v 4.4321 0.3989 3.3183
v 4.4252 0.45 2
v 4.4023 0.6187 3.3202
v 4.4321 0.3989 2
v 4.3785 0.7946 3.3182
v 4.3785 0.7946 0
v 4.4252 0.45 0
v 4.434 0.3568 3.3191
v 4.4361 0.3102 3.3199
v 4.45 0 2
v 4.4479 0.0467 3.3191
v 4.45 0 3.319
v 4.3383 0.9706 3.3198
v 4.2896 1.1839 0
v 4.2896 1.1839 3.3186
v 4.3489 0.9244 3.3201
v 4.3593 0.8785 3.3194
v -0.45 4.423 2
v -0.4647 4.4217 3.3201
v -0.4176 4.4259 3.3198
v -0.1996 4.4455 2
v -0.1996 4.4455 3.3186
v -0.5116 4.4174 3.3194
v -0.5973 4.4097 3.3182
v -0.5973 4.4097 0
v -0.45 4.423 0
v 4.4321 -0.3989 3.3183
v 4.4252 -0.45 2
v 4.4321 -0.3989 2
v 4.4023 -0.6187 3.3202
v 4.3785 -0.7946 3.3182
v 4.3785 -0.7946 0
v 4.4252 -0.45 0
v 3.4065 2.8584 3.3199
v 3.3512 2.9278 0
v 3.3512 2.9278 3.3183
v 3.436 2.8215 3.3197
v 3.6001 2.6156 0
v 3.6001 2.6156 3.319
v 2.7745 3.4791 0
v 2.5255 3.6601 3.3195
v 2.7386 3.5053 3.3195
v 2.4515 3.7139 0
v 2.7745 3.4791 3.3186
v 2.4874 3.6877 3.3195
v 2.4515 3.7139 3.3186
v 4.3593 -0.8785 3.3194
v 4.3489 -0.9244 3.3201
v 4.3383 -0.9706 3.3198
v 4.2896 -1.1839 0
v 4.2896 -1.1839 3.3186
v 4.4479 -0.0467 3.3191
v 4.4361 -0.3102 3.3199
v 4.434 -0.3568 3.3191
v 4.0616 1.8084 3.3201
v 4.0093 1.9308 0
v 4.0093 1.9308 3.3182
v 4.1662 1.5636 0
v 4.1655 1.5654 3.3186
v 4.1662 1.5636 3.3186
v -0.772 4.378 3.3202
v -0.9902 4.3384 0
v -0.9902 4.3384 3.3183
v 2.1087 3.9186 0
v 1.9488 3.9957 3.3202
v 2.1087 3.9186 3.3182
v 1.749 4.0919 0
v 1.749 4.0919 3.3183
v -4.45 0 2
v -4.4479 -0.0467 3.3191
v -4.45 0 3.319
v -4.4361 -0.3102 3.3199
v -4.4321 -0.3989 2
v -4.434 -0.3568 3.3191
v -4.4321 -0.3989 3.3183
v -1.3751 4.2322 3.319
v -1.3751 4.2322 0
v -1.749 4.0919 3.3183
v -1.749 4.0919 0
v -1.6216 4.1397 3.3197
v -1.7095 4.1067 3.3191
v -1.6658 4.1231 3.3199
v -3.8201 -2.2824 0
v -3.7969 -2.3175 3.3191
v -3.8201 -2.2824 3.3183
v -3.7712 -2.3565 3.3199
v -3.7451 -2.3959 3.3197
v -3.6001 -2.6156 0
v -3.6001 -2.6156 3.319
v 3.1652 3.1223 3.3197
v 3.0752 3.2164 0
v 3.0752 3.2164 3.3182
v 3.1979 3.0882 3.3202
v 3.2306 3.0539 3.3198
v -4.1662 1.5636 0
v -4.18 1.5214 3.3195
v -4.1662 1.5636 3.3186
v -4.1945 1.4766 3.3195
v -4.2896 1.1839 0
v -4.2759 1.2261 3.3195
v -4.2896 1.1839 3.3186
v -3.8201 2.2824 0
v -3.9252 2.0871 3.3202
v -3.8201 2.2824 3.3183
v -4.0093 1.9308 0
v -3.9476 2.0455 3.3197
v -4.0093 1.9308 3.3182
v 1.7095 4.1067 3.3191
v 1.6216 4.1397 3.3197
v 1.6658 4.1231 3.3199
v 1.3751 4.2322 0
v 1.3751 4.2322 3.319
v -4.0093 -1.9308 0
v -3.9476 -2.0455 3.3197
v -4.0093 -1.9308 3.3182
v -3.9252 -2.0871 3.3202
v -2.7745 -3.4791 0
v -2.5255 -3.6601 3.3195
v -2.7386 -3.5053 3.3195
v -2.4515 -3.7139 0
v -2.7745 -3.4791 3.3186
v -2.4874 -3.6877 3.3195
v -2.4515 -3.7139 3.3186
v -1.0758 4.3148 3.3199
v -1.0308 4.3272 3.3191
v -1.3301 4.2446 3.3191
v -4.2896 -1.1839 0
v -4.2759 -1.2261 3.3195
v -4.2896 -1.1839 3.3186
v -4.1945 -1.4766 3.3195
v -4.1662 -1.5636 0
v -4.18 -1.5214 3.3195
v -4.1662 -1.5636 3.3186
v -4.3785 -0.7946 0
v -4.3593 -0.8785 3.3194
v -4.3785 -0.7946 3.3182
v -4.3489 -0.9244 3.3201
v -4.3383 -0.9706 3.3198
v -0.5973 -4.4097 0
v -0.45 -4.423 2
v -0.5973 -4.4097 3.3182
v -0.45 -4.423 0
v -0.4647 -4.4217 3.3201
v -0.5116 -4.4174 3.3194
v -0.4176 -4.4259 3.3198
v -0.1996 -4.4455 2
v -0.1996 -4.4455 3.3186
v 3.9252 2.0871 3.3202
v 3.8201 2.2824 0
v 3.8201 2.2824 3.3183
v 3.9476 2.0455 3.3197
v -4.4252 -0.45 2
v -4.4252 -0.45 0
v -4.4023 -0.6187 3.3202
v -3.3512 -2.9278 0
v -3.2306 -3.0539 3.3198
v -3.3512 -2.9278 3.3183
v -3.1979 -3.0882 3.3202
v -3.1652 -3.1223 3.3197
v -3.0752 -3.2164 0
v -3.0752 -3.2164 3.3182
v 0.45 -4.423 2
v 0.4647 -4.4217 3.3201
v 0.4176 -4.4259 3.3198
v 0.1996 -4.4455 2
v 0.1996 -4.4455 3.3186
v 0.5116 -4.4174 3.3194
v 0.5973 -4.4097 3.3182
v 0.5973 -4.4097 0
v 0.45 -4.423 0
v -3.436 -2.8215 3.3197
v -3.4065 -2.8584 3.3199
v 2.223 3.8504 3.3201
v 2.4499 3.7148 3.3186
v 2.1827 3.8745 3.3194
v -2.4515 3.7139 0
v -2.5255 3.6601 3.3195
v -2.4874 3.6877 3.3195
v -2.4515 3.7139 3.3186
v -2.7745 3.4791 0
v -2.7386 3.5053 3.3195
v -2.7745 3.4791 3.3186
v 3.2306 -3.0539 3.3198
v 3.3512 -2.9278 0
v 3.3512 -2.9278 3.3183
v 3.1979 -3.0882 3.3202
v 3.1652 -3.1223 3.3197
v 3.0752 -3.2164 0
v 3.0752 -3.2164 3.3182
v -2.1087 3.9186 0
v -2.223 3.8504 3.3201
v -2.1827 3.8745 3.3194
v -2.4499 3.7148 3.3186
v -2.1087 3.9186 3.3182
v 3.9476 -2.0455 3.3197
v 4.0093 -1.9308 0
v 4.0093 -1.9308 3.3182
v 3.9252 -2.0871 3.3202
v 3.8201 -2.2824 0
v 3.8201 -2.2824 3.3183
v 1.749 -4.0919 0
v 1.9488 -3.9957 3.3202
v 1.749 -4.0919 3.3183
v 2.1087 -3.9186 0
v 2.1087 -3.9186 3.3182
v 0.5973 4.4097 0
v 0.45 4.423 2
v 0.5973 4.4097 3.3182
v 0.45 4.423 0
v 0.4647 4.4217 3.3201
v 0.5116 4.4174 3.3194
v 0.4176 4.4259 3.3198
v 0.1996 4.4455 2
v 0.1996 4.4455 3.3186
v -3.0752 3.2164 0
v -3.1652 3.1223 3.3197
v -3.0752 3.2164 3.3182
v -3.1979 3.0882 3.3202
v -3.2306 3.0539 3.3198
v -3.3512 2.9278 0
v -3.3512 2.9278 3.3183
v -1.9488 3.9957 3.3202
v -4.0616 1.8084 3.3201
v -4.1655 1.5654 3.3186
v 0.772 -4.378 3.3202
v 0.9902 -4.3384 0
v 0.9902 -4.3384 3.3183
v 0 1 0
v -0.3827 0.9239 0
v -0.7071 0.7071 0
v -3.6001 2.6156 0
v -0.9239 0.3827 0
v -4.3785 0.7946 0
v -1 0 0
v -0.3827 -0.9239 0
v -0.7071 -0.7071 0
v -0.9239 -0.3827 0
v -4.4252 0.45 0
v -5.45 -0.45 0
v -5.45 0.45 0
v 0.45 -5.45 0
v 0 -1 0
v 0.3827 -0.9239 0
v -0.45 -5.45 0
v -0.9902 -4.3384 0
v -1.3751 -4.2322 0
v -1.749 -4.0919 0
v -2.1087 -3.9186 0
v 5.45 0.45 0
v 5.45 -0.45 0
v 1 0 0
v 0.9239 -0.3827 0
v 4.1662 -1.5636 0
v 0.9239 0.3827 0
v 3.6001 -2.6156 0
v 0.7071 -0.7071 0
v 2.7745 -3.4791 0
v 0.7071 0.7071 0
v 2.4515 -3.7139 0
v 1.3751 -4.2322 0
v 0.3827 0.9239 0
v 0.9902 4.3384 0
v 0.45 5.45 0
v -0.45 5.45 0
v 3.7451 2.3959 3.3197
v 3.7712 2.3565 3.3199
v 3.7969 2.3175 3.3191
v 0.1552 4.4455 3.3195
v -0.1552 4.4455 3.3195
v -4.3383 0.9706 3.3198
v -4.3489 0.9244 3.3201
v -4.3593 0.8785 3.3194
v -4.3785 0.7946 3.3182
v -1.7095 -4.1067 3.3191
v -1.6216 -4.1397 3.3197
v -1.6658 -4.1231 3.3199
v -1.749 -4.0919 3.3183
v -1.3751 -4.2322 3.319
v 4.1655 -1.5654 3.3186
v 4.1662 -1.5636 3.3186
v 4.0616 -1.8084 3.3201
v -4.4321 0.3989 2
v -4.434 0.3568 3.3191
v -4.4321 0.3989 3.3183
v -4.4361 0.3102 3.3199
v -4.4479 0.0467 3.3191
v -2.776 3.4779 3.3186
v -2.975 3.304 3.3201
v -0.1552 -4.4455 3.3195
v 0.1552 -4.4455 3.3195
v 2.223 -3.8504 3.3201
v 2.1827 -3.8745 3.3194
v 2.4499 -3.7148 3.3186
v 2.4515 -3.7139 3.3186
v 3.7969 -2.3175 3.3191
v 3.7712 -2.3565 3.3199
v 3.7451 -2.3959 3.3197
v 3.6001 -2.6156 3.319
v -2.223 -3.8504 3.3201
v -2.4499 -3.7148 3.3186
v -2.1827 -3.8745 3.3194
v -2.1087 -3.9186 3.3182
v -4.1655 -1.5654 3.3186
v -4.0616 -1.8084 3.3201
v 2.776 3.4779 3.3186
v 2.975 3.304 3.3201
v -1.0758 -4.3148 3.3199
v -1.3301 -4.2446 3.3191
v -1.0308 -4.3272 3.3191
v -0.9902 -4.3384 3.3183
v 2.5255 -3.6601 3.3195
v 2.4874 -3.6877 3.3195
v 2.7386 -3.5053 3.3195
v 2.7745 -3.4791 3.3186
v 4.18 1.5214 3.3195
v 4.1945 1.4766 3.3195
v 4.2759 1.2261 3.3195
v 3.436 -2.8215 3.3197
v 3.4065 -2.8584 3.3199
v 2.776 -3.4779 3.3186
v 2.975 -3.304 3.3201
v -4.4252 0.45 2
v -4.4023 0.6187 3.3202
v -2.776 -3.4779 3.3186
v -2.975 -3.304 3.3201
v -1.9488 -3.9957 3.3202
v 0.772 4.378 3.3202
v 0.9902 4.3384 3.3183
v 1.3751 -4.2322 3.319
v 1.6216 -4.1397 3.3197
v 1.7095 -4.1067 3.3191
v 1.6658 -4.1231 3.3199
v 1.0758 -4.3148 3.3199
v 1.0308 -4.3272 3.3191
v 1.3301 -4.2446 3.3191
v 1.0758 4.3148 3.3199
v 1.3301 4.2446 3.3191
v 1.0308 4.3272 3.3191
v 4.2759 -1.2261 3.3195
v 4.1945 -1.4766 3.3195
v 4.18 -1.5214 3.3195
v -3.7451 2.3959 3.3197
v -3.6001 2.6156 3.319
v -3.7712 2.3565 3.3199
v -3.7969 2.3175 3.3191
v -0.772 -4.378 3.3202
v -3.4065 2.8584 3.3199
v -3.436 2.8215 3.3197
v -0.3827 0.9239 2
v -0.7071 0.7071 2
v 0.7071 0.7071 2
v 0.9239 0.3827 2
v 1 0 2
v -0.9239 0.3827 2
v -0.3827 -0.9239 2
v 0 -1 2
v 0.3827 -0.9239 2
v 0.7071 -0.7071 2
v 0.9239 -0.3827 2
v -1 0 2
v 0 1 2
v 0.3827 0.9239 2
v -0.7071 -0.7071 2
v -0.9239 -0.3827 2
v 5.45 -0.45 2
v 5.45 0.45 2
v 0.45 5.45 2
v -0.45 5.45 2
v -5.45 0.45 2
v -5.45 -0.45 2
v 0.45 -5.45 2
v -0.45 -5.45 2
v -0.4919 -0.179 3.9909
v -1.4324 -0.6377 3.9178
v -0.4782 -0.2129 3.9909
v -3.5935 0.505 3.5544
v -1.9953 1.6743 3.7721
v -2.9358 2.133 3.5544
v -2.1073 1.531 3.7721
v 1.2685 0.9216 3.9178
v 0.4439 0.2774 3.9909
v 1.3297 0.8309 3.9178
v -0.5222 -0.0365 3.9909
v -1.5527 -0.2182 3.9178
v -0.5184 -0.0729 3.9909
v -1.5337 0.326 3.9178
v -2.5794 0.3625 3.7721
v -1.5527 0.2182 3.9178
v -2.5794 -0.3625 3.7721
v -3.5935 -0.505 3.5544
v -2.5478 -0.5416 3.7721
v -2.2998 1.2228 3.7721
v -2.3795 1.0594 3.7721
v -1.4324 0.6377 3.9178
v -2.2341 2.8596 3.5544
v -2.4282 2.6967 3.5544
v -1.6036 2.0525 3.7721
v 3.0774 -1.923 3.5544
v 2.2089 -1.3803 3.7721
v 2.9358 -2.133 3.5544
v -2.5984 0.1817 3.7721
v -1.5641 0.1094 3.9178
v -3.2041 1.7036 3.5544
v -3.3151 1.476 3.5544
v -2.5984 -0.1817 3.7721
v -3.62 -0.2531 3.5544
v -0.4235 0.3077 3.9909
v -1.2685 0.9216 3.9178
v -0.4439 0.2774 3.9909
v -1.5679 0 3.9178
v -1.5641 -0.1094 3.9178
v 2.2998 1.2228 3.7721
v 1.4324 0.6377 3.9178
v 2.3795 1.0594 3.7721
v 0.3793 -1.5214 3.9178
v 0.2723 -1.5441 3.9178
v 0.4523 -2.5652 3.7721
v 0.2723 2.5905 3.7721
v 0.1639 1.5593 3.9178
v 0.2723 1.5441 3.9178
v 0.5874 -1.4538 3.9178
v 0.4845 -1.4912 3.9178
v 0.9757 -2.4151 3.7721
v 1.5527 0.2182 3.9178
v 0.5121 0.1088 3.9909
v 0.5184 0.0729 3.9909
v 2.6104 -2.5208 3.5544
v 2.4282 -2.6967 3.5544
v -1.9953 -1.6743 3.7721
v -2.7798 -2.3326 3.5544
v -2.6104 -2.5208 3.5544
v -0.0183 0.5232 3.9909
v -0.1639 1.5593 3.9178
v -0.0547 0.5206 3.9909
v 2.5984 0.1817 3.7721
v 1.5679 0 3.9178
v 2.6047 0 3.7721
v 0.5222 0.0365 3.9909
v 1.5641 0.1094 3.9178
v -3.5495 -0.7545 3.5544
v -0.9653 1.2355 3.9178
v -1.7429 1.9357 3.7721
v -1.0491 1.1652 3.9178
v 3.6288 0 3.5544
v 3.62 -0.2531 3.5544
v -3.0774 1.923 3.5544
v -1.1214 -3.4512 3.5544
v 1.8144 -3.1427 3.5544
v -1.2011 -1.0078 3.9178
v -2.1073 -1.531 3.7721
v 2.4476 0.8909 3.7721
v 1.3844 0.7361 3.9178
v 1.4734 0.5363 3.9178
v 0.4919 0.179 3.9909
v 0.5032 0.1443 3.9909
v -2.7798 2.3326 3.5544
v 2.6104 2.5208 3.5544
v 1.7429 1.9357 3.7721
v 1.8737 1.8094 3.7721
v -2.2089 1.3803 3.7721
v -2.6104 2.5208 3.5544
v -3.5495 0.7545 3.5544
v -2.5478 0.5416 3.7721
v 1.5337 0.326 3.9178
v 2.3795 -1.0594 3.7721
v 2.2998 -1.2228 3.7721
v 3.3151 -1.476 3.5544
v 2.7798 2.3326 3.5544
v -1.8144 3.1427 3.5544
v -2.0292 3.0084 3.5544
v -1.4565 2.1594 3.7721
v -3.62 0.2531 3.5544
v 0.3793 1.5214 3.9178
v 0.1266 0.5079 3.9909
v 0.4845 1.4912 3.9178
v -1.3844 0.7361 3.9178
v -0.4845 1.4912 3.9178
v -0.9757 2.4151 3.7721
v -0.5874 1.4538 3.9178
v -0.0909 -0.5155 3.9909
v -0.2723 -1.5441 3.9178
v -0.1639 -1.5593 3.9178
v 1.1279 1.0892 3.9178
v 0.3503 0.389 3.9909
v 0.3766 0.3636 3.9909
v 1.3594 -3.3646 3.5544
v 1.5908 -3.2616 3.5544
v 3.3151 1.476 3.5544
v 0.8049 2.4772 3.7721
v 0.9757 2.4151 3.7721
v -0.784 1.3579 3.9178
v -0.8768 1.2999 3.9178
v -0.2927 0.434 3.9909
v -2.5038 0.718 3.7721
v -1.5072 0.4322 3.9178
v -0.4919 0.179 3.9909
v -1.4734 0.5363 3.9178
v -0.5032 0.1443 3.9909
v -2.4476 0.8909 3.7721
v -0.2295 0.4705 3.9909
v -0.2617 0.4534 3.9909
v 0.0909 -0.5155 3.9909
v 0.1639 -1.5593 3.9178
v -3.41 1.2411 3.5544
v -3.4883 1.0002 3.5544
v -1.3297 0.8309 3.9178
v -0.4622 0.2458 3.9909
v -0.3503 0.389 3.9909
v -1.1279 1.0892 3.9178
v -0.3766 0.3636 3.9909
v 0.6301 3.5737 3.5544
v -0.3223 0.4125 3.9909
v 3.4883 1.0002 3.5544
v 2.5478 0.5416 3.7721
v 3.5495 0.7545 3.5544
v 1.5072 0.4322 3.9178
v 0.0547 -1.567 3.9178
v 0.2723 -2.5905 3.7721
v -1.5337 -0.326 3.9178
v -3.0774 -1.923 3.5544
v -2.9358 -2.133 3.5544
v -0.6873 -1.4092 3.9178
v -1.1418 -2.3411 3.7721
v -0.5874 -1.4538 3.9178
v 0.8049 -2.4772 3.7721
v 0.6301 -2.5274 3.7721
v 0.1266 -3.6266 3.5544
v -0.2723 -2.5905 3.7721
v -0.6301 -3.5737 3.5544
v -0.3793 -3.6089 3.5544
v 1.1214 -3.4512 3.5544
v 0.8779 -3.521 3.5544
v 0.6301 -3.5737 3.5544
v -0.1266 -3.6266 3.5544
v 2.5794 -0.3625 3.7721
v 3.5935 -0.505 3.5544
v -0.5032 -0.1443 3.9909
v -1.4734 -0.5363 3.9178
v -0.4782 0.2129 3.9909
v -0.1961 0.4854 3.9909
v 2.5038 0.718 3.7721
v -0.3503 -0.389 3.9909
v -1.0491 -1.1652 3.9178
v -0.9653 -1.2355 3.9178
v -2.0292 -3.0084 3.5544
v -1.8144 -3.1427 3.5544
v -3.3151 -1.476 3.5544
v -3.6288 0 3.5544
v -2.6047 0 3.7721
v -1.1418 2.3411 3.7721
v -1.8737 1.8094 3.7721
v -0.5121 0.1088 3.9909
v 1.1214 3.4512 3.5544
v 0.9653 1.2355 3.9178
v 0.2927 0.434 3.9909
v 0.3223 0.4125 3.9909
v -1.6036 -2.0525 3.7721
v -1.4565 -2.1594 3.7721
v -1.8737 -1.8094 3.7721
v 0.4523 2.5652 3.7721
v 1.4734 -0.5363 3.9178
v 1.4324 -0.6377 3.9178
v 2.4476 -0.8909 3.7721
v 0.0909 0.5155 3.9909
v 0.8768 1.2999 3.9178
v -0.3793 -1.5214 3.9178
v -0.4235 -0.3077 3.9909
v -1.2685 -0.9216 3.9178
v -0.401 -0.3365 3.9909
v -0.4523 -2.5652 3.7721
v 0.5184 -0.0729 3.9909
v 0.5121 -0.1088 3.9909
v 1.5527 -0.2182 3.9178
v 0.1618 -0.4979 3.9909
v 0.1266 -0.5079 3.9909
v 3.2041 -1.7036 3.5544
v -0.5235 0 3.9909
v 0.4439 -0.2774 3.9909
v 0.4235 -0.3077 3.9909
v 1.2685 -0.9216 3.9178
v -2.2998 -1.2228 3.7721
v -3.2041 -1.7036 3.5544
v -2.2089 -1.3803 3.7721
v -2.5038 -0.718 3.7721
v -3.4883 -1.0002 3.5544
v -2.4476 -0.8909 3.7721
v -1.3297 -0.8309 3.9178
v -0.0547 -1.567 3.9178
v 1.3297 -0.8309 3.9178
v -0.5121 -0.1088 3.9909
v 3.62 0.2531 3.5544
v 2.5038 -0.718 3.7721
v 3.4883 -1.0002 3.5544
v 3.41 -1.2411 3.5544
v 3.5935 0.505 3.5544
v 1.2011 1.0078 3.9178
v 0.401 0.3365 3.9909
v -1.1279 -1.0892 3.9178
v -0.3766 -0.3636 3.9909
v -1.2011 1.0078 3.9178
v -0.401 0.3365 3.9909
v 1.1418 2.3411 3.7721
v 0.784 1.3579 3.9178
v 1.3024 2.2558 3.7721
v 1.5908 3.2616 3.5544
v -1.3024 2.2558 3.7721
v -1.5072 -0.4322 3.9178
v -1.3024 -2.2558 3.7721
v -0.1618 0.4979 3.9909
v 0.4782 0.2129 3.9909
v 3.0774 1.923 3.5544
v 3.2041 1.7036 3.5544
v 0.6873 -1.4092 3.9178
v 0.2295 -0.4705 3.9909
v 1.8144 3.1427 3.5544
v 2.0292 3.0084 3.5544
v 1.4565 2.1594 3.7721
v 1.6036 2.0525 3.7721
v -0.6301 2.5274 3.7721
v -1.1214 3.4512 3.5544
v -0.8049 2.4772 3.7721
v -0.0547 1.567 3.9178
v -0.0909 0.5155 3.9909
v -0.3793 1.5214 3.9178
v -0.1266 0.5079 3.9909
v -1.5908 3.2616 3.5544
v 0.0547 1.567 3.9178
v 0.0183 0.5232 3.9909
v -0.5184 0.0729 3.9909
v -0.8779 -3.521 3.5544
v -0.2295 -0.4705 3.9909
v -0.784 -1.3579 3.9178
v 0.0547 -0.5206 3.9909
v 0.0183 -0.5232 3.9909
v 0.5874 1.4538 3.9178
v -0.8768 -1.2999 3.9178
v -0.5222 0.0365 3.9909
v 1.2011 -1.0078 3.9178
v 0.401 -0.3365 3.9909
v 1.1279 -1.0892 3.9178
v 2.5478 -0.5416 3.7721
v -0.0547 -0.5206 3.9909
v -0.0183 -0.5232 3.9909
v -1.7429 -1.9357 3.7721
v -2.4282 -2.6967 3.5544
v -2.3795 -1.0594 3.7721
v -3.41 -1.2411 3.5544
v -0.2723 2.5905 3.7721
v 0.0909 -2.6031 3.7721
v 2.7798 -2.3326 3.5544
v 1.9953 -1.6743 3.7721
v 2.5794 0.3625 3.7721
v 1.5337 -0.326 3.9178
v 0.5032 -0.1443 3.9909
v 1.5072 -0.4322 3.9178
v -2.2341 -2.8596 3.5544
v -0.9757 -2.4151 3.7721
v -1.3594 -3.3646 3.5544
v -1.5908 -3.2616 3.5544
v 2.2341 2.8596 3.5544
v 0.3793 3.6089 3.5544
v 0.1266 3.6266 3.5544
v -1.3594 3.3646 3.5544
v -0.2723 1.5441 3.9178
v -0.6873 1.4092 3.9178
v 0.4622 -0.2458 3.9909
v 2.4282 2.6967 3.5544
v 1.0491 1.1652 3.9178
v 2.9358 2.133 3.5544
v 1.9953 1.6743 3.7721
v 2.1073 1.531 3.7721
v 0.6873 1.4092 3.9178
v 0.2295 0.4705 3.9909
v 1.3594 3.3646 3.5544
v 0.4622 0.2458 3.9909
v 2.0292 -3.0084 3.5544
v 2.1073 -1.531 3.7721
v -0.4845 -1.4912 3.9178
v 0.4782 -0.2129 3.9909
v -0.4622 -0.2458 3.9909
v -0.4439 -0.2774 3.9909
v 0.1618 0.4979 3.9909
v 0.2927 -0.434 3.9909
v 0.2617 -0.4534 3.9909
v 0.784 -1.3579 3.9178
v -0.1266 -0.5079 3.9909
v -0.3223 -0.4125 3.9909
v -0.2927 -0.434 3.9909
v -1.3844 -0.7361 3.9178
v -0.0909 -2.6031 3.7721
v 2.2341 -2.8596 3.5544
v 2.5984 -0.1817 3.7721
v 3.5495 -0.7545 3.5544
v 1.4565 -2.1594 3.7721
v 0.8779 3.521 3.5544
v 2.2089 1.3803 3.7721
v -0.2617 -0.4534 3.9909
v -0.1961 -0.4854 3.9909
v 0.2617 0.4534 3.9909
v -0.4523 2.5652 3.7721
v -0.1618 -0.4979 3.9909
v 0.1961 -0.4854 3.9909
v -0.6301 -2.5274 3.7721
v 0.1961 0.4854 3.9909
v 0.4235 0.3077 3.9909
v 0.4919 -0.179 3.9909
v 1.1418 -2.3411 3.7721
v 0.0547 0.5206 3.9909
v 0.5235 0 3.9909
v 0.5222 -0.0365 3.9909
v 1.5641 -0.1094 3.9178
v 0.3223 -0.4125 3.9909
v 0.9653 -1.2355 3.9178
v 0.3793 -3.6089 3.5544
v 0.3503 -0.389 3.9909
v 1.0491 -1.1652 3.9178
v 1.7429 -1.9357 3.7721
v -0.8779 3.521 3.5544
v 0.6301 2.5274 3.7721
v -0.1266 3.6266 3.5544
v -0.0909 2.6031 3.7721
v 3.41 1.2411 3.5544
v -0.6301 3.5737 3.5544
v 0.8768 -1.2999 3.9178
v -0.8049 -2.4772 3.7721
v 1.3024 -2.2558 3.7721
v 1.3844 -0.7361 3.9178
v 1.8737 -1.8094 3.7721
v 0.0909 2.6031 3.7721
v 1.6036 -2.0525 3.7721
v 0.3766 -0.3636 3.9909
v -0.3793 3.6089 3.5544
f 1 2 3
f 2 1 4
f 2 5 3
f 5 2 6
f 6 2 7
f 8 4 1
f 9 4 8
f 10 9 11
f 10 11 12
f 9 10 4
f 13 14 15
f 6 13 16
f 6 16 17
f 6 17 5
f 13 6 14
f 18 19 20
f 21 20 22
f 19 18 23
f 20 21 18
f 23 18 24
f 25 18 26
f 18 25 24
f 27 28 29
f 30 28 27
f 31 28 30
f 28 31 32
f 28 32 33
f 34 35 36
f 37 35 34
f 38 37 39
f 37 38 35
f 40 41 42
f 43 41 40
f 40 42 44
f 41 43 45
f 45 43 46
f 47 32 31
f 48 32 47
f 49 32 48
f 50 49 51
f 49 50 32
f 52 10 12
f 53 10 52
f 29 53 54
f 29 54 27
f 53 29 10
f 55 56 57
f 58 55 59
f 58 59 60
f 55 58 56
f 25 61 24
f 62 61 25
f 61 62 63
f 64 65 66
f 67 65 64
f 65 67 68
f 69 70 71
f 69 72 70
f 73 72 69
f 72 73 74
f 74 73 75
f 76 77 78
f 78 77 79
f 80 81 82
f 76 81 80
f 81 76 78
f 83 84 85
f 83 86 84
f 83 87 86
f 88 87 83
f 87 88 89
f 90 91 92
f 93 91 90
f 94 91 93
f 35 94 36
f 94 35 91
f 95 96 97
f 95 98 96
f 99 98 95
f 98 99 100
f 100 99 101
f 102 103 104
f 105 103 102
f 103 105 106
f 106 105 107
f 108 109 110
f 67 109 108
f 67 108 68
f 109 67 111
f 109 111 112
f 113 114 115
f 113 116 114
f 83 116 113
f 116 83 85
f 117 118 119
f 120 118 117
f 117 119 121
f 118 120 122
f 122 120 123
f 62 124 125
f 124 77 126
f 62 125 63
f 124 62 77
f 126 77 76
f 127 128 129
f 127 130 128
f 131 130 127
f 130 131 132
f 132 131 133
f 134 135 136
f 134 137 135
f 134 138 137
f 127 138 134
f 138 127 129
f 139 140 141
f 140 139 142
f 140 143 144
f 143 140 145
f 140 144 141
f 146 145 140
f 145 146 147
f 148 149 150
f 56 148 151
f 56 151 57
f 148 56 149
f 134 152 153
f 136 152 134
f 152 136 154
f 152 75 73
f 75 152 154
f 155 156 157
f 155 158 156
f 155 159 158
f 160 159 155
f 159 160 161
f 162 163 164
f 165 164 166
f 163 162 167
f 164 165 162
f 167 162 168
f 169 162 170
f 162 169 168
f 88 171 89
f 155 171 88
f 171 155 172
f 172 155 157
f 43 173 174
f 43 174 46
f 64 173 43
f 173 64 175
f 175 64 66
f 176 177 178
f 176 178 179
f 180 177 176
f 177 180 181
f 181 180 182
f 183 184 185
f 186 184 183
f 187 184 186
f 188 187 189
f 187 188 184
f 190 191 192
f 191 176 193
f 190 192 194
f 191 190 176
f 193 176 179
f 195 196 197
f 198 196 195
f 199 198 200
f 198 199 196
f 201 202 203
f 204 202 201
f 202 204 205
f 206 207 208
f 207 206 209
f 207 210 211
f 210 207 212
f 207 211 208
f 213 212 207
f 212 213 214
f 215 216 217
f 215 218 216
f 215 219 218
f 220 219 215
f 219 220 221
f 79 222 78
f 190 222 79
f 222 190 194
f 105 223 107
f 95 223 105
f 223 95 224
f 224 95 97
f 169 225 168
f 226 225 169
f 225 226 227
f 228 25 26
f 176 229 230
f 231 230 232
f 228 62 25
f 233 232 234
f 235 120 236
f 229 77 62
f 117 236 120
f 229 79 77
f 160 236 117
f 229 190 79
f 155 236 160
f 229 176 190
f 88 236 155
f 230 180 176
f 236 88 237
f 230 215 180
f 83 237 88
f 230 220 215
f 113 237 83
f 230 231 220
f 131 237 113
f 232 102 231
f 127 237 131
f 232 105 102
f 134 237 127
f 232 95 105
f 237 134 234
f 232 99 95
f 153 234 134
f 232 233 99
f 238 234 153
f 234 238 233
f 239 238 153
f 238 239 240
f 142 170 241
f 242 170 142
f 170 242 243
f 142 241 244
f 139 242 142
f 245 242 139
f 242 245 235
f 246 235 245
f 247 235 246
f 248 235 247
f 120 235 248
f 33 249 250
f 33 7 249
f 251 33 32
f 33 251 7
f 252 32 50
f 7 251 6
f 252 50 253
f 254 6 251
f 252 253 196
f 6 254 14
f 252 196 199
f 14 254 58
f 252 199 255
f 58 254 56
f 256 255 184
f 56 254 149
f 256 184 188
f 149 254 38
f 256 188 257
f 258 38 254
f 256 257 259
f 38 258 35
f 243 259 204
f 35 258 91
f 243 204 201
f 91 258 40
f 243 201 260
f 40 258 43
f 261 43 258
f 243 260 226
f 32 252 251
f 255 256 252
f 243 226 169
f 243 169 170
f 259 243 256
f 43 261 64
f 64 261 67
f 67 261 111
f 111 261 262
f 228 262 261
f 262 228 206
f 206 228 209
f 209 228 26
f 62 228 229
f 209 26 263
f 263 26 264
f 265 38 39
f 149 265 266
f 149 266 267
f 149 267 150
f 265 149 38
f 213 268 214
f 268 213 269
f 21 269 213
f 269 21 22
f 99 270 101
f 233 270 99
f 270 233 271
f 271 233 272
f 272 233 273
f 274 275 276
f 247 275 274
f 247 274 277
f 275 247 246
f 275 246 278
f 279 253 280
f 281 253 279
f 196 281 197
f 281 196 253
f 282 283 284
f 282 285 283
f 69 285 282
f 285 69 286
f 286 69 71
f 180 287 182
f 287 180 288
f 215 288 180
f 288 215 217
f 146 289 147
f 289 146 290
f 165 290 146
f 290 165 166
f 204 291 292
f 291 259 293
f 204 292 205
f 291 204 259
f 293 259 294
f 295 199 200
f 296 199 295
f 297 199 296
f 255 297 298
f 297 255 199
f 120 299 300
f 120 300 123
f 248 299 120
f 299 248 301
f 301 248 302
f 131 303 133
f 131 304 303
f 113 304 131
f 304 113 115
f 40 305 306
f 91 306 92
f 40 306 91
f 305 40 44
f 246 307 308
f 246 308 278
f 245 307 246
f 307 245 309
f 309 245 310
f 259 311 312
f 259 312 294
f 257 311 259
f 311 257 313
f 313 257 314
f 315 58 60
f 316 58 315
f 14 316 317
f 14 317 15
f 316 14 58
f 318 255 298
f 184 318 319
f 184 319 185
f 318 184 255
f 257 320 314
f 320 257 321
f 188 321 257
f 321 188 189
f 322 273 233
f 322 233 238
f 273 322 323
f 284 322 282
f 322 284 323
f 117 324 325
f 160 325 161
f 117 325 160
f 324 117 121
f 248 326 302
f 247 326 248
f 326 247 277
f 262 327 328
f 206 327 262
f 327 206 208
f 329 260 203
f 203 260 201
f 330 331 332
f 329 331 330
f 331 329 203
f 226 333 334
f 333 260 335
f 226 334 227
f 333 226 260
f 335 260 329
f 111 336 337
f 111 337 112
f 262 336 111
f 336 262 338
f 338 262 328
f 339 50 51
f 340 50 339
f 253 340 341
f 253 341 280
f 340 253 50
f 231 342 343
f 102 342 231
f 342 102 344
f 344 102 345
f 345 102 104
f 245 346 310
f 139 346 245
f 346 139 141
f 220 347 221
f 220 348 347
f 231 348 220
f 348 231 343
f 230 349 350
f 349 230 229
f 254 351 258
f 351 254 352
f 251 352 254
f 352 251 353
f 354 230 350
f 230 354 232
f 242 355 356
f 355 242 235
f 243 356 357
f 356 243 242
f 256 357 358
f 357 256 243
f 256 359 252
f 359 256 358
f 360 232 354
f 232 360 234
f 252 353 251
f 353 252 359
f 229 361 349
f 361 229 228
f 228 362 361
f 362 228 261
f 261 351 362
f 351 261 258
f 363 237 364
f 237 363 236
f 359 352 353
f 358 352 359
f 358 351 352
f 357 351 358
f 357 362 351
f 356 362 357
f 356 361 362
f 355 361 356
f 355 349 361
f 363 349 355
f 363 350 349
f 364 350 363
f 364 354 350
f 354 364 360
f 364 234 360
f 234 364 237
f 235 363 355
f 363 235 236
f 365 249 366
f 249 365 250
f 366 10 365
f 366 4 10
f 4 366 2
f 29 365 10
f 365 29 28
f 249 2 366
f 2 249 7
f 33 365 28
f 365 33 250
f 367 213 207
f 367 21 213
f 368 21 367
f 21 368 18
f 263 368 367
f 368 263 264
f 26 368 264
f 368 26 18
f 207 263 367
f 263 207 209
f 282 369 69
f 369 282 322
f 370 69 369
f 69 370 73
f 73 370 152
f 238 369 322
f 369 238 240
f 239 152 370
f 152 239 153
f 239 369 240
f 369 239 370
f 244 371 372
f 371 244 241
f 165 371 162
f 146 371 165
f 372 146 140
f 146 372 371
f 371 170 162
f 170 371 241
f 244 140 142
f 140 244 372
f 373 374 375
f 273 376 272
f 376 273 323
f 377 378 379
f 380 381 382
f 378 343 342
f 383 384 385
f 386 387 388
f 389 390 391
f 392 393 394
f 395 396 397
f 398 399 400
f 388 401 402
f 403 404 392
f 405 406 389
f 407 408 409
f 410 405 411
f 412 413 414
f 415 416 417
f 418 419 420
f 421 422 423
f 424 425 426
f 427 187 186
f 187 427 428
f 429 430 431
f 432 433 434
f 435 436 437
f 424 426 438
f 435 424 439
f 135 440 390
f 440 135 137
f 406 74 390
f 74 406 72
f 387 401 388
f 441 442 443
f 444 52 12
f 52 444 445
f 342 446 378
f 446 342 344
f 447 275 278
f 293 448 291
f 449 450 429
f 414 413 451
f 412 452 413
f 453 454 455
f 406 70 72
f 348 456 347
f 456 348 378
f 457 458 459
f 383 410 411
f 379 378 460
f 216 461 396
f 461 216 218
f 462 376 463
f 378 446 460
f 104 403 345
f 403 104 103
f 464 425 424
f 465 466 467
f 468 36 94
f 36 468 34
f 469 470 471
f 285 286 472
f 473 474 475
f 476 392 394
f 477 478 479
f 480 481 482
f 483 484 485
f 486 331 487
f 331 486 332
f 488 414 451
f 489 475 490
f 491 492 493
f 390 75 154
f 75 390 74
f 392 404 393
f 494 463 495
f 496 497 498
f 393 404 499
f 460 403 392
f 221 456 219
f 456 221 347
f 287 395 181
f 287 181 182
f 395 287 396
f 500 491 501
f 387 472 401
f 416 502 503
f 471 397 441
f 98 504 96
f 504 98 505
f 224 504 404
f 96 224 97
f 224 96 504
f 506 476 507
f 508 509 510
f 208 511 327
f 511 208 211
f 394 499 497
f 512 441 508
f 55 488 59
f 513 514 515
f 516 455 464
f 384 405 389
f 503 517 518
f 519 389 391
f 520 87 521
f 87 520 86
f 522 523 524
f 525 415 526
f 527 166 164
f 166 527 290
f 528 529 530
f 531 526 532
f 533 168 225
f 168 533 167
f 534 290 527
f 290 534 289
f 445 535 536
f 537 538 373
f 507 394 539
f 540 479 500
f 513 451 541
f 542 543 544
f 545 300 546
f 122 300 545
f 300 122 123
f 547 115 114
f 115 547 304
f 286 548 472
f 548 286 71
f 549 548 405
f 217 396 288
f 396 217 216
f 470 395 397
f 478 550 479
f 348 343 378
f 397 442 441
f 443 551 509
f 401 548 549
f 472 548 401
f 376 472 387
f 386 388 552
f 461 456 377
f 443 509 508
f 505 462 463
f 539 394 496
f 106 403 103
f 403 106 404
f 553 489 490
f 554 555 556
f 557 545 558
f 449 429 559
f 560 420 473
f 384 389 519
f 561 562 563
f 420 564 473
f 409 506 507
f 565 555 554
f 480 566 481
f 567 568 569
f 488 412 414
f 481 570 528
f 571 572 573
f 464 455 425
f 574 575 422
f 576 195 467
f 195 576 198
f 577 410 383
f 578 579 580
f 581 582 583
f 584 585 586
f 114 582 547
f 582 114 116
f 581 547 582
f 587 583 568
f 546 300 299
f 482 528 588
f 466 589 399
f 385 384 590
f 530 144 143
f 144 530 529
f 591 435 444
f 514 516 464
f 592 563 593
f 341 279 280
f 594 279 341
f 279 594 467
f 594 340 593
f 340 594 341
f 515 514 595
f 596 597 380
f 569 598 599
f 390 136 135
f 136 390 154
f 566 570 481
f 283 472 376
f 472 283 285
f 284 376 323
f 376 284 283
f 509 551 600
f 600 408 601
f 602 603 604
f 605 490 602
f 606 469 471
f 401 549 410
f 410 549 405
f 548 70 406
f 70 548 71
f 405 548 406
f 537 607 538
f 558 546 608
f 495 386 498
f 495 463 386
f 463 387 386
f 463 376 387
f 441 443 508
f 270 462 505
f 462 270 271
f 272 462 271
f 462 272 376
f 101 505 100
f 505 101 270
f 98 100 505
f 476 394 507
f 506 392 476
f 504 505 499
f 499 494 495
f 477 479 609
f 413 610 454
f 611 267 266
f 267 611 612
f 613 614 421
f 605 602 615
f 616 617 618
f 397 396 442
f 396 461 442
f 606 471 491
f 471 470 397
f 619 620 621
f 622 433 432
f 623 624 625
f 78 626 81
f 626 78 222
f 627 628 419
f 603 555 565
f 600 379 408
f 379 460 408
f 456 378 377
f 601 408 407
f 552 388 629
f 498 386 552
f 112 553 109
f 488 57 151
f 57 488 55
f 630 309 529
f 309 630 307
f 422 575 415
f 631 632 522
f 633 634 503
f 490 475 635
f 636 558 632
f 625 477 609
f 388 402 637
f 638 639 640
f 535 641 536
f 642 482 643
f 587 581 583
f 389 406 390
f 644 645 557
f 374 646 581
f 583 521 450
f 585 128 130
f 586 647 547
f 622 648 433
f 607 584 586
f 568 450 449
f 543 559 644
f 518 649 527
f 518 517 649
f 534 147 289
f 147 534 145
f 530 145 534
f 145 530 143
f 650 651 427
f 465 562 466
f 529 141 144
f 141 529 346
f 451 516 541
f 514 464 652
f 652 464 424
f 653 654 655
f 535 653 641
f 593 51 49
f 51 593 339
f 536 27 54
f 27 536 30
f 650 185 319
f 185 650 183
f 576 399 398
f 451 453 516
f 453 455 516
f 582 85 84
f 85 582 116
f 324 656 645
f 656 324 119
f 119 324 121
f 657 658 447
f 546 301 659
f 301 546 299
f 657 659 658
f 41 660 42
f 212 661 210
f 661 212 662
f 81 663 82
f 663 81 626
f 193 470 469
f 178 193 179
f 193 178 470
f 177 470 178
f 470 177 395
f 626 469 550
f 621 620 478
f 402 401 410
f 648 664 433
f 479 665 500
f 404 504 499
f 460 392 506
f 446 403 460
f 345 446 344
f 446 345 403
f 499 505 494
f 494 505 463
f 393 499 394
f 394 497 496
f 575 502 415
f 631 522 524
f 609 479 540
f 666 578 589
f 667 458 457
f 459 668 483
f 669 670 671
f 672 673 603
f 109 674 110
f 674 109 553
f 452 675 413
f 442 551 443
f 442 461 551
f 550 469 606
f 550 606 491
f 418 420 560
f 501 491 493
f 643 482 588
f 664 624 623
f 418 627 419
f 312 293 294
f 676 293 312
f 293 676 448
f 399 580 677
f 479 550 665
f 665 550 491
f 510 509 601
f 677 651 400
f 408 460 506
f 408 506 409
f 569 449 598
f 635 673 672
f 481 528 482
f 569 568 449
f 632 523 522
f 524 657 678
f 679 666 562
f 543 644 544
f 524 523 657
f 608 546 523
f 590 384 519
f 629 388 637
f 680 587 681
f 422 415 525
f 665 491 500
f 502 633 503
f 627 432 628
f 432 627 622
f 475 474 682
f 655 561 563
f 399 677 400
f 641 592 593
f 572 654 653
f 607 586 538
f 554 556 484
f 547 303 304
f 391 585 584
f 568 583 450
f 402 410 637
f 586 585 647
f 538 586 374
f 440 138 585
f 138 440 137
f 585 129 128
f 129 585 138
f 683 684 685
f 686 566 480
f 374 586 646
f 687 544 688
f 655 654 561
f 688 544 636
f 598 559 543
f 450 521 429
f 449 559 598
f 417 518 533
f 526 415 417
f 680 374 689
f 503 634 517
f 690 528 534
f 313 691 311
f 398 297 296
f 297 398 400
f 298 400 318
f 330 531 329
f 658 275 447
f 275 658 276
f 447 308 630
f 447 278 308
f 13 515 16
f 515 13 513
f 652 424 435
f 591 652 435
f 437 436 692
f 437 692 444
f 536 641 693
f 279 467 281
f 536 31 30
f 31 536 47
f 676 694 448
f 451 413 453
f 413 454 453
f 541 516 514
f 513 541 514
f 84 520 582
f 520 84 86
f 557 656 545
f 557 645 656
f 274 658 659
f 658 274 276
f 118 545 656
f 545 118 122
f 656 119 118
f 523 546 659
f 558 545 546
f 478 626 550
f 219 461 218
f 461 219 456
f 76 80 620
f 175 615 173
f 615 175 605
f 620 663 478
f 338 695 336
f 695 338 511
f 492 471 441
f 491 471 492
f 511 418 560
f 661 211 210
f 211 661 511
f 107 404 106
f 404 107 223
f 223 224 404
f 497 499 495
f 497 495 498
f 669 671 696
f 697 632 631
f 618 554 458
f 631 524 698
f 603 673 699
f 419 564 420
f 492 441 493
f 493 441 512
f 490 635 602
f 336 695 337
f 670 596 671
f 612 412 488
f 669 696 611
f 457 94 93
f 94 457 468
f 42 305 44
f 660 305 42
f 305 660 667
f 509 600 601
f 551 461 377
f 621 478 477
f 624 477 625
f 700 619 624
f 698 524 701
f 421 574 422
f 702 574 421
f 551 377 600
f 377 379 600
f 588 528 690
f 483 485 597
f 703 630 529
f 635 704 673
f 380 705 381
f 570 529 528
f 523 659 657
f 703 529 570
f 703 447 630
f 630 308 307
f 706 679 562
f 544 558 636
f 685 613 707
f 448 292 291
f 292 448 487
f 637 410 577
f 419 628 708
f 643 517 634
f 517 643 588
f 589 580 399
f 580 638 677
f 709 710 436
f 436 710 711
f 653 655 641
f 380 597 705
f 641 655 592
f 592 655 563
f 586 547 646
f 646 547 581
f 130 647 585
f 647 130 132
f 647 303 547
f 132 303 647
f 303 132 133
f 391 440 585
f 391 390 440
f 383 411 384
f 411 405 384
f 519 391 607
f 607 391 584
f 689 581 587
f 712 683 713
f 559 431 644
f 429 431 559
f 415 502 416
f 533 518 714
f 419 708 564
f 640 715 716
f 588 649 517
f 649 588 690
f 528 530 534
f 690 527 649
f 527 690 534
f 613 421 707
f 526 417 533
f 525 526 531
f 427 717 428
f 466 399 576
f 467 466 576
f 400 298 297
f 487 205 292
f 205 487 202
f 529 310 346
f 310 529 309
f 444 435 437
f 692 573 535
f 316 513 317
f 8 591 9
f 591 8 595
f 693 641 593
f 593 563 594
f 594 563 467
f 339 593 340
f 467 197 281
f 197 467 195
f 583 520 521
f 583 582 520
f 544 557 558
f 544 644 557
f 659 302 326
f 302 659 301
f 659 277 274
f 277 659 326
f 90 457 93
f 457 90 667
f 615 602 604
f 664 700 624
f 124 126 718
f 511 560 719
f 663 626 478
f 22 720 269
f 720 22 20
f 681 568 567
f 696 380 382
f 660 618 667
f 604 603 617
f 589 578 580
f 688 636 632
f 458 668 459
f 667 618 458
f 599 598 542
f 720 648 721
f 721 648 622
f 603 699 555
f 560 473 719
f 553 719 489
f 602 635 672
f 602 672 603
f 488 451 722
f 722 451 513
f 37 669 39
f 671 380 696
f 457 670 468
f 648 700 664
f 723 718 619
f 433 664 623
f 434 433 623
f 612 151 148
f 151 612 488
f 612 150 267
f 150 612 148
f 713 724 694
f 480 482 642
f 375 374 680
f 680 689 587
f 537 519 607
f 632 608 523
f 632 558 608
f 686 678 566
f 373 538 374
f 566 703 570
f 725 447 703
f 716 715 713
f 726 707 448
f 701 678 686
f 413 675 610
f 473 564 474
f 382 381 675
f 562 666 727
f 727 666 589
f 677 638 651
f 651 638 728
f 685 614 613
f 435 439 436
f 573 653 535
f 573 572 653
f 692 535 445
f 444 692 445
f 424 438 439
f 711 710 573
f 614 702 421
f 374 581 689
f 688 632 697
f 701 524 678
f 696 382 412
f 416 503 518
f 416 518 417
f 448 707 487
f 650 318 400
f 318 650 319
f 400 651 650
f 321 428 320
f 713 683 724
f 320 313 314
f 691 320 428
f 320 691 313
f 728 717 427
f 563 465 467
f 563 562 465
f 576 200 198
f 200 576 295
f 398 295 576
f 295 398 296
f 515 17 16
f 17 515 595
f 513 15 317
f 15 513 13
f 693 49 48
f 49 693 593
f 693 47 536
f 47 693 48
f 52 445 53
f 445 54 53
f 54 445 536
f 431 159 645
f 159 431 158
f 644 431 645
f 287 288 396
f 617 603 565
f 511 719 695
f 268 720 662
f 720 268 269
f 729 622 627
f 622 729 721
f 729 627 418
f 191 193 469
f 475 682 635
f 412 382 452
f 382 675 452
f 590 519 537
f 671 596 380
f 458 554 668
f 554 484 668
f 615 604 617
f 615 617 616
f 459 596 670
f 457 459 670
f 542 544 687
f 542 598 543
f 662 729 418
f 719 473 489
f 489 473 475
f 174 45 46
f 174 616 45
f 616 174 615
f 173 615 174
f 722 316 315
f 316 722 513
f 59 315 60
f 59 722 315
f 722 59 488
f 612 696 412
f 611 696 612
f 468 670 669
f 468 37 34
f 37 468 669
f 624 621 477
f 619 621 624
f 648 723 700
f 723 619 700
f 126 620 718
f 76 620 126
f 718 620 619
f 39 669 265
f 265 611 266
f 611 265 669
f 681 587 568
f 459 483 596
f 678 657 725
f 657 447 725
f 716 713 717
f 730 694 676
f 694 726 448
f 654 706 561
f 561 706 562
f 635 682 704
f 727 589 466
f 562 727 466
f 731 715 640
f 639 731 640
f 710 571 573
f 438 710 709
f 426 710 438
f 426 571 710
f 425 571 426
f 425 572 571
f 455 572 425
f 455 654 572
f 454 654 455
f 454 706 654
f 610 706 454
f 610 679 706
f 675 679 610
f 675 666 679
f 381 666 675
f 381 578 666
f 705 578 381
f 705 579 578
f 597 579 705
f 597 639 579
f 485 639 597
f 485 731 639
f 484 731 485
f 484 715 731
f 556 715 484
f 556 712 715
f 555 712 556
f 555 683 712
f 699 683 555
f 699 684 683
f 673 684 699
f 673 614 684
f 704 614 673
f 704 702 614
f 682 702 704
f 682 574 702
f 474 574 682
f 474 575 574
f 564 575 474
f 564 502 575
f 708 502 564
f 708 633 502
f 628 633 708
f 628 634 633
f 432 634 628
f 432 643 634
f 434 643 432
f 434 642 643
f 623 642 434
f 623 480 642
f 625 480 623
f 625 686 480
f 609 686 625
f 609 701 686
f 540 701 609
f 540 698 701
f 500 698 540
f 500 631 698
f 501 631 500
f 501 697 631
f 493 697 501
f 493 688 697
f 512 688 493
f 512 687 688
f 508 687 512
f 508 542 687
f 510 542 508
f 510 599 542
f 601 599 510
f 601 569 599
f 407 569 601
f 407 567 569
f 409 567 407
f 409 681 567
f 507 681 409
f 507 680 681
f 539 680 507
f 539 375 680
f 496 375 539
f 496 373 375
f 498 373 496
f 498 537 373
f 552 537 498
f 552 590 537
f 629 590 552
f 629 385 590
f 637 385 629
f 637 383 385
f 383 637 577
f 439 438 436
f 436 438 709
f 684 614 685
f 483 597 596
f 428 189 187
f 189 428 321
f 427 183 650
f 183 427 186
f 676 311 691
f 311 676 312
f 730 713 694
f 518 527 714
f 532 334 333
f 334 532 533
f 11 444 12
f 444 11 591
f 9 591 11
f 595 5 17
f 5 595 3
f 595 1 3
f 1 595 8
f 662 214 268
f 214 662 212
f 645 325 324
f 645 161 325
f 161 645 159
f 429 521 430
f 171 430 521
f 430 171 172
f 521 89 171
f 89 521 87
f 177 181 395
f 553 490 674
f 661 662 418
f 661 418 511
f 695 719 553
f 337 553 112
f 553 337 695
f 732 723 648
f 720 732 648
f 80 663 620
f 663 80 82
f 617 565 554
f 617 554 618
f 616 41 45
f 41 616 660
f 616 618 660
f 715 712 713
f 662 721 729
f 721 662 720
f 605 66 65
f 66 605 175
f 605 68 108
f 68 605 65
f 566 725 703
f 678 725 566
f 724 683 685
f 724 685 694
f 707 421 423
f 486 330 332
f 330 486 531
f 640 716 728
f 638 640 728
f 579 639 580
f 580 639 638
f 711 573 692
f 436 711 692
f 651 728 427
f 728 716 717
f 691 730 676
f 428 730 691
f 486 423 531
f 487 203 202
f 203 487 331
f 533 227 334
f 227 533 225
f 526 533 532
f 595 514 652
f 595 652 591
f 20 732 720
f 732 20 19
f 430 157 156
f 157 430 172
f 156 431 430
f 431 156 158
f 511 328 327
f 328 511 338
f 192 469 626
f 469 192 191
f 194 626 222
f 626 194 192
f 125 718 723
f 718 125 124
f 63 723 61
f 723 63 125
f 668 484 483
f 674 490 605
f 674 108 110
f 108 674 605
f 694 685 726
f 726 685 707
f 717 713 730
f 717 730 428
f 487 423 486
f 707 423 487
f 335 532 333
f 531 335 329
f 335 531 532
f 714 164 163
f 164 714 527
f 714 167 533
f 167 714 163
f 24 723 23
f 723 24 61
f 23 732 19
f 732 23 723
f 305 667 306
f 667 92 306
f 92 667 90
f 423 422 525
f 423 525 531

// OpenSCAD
// file: power-button.scad
$fs = 0.4;

R = 8.9 / 2; // Button radius.
WALLS = 1; // Case wall thickness.
HPCB = 3; // Height of the button PCB.
SPACE = 6; // Distance between main PCB and front panel.
PRESS = 1; // How much the button moves when pressed.
HCOL = 3; // Height of the button's black shaft.
RCOL = 2 / 2; // Radius of the button's black shaft.
WRAIL = 0.9; // Width of the rail.

BTN_HEIGHT = SPACE + WALLS - PRESS - HPCB;
assert(SPACE - PRESS - HPCB > 0);
assert(BTN_HEIGHT > 0);
assert(HCOL - PRESS > 0);

module rail() {
  translate([RCOL, -WRAIL / 2, 0])
    cube([R - RCOL + 1, WRAIL, SPACE - PRESS - HPCB]);
}

module power_button() {
  color("#b13e53") union() {
      difference() {
        cylinder(h=BTN_HEIGHT, r=R);
        translate([0, 0, -.1])
          cylinder(h=HCOL - PRESS + .1, r=RCOL);
      }
      rail();
      rotate(90) rail();
      rotate(180) rail();
      rotate(270) rail();
    }
}

power_button();
// main file
include <power-button.scad>

$fa = 4;

// The radius of the sphere used for bending the top.
RSPH = 15;
// Elevation of the button from the case.
ELVTN = 1;

module button() {
  color("#1a1c2c")
    intersection() {
      translate([0, 0, BTN_HEIGHT])
        cylinder(h=20, r=R);
      translate([0, 0, ELVTN + BTN_HEIGHT - RSPH])
        sphere(r=RSPH);
    }
}

button();
